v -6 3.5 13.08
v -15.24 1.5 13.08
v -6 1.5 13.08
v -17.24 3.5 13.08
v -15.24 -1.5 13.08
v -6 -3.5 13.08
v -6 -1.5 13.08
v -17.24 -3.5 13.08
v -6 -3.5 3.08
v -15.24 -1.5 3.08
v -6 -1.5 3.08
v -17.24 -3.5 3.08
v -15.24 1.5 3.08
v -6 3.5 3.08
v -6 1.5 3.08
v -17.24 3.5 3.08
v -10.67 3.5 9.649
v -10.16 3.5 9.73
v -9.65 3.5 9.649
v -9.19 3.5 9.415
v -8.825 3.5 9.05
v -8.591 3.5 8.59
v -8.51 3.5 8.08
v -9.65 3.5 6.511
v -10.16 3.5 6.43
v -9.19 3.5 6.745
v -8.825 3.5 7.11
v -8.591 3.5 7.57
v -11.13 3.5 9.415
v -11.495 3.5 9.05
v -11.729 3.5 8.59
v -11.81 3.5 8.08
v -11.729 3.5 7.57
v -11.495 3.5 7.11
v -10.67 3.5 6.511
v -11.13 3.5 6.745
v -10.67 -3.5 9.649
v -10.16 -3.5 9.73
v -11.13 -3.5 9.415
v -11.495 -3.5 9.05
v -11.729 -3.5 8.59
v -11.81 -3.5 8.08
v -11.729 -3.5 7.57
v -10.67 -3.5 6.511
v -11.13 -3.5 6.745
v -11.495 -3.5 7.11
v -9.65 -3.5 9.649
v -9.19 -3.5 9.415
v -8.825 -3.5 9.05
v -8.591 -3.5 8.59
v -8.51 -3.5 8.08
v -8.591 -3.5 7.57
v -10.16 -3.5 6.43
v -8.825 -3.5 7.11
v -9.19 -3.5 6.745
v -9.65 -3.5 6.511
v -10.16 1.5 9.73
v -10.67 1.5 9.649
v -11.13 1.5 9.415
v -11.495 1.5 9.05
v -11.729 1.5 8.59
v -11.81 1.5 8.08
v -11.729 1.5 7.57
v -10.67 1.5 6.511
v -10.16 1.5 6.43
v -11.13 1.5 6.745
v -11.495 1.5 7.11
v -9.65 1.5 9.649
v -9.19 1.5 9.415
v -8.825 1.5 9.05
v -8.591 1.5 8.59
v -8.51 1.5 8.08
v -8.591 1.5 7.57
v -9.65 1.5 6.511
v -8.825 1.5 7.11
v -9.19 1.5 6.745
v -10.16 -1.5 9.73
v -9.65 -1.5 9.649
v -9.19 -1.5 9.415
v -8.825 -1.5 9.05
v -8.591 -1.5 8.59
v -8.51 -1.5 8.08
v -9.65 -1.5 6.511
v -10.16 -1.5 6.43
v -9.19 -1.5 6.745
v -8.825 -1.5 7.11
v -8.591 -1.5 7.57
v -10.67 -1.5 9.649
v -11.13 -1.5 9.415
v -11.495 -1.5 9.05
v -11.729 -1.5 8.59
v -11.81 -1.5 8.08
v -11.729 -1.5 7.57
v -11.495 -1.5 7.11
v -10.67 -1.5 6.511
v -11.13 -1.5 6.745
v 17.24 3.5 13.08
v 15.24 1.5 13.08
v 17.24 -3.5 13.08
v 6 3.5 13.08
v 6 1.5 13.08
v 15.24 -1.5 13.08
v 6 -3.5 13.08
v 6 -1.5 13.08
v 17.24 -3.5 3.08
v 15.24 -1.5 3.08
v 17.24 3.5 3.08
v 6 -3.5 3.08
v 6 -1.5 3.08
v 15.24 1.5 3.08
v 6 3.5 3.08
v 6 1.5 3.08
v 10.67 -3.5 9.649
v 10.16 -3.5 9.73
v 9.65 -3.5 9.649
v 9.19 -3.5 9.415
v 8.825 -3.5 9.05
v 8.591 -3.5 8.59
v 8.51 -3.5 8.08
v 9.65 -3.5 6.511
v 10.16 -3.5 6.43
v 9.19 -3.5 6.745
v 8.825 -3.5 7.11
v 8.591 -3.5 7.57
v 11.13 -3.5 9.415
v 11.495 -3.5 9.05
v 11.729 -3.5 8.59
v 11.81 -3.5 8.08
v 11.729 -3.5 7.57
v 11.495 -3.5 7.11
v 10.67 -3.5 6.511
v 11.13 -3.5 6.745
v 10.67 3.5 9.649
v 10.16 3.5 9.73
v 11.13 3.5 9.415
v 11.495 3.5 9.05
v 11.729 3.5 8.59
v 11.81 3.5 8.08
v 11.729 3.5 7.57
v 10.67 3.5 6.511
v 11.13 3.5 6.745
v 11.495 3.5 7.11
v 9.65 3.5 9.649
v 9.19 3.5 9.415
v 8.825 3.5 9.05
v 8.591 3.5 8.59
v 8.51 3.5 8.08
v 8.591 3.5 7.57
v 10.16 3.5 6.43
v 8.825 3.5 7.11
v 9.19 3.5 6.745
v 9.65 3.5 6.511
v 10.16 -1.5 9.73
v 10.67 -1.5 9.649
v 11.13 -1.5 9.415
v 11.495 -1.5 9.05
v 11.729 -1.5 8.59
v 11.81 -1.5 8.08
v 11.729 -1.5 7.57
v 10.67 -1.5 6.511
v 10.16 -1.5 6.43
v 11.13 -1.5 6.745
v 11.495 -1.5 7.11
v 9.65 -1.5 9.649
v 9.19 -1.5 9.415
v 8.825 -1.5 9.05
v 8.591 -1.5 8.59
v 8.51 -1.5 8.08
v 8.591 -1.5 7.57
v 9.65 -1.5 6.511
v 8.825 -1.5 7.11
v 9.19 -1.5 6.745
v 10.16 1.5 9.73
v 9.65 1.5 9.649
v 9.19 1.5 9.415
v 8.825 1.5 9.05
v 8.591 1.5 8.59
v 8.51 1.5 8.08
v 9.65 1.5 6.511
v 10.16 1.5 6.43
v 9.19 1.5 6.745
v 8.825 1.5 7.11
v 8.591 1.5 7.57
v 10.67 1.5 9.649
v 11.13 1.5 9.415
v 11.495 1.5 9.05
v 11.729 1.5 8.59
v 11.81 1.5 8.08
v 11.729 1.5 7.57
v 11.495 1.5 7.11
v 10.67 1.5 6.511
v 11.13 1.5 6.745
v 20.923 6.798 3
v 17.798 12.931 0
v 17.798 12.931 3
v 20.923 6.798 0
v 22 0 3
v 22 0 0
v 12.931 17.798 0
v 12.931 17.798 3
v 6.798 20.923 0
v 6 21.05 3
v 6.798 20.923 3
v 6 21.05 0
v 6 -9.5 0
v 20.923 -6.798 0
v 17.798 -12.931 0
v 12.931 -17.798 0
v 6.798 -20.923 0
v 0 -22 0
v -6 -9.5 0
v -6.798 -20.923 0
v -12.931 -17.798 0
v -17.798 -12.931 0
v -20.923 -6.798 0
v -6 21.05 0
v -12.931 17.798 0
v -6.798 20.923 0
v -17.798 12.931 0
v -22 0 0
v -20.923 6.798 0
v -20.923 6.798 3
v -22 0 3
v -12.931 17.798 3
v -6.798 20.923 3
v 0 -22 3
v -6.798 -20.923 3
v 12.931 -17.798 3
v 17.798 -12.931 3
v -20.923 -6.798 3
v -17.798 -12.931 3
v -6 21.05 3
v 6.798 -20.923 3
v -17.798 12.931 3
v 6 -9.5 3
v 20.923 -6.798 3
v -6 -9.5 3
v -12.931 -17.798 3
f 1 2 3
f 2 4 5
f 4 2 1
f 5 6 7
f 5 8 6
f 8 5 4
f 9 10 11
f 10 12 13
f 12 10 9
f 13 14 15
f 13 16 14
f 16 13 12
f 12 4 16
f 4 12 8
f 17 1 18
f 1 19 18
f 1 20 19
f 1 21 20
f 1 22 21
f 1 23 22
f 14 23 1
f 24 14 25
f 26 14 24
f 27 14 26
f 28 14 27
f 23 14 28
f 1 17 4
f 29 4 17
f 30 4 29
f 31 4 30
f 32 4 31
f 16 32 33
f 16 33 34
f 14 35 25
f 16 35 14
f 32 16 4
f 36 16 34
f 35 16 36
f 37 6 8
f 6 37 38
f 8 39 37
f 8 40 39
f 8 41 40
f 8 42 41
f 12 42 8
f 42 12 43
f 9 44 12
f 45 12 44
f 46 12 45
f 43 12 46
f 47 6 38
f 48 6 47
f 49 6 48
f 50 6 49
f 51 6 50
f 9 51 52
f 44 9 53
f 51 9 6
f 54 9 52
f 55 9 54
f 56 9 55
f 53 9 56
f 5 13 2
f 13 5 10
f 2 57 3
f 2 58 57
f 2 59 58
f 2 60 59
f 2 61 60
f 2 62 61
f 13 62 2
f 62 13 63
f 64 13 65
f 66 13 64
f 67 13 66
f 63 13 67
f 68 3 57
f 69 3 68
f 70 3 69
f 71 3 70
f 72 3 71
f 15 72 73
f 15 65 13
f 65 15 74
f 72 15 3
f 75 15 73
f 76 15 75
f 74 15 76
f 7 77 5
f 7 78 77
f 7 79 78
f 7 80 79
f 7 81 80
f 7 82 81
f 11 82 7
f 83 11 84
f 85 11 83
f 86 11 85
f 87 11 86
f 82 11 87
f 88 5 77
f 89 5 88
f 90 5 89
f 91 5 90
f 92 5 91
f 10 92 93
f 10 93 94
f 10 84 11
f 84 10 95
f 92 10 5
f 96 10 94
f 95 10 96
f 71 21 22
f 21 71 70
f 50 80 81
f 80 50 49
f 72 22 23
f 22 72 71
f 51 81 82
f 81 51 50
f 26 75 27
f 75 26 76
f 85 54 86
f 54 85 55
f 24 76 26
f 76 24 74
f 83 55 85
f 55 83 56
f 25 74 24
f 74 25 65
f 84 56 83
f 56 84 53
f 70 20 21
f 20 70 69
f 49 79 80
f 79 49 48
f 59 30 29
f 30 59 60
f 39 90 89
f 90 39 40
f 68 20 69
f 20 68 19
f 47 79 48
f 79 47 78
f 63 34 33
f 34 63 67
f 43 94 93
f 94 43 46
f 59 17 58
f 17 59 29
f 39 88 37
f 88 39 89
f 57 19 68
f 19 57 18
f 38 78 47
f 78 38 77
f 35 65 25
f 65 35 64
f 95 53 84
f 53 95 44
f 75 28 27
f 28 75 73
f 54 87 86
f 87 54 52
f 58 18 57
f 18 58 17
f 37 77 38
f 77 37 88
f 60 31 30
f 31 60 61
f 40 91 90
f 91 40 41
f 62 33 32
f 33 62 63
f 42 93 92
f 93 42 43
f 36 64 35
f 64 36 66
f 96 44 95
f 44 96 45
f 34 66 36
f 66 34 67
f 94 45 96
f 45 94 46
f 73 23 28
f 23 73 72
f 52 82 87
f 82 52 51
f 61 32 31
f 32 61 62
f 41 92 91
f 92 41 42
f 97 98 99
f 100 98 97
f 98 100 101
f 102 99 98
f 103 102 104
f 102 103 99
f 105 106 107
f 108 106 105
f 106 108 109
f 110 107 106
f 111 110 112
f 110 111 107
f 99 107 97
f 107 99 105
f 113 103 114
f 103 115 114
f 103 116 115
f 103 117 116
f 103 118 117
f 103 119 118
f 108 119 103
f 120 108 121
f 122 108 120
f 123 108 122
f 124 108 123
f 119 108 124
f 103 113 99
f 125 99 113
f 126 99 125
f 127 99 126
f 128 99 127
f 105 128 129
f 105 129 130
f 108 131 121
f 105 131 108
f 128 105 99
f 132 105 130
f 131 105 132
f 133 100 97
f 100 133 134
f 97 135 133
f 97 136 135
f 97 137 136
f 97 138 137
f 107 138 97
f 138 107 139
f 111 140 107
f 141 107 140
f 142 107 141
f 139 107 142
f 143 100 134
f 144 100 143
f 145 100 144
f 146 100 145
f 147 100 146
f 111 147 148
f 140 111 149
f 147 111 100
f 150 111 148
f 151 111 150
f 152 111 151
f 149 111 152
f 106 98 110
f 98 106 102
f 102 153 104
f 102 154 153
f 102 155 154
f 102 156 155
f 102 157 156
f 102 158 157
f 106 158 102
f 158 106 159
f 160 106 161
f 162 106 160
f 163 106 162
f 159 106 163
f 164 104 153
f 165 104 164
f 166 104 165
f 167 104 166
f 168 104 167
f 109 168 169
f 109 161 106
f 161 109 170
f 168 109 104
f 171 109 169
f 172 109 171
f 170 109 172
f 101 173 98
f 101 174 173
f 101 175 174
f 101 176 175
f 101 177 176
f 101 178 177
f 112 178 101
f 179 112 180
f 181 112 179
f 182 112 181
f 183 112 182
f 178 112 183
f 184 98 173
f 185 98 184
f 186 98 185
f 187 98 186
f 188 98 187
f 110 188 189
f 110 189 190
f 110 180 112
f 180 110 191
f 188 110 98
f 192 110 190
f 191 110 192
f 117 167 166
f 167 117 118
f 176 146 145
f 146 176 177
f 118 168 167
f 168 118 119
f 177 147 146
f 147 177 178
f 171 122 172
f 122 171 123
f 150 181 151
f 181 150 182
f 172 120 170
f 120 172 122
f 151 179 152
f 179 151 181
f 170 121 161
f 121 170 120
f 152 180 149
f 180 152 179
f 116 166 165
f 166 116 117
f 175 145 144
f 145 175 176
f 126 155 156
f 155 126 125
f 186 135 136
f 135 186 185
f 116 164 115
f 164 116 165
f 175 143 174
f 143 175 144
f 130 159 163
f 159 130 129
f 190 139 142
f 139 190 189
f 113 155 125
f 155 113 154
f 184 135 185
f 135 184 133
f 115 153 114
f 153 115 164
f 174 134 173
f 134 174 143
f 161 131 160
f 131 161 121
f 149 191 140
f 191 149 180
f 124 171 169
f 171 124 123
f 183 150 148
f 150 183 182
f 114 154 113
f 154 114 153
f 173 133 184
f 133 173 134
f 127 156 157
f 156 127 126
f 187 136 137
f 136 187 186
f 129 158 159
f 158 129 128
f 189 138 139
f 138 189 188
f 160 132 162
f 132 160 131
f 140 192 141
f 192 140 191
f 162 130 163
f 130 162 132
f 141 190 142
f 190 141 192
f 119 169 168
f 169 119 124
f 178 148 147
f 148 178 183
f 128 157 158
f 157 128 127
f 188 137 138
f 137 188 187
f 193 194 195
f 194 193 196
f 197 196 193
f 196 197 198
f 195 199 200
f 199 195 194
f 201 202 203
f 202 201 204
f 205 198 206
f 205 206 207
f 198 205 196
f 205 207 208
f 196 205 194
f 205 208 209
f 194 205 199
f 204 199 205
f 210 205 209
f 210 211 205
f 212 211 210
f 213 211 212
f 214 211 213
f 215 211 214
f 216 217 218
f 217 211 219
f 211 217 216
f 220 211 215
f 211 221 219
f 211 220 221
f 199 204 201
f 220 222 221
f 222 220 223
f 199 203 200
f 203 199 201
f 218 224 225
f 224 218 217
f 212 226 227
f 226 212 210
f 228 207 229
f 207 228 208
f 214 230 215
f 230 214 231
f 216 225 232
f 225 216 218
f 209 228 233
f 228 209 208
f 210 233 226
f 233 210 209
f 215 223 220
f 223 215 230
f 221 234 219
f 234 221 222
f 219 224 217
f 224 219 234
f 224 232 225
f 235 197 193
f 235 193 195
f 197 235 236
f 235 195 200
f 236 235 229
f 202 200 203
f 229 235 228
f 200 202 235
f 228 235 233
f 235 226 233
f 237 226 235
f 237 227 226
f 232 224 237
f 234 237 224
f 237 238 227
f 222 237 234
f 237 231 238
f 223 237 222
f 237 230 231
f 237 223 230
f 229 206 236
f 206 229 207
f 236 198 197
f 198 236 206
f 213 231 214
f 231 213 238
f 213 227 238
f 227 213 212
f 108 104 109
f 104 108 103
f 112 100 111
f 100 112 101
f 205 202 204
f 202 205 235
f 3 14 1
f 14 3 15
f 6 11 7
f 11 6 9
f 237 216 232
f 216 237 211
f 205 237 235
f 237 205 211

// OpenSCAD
// file: lib/polyScrewThread_r1.scad
/*
 *    polyScrewThread_r1.scad    by aubenc @ Thingiverse
 *
 * This script contains the library modules that can be used to generate
 * threaded rods, screws and nuts.
 *
 * http://www.thingiverse.com/thing:8796
 *
 * CC Public Domain
 */

module screw_thread(od,st,lf0,lt,rs,cs)
{
    or=od/2;
    ir=or-st/2*cos(lf0)/sin(lf0);
    pf=2*PI*or;
    sn=floor(pf/rs);
    lfxy=360/sn;
    ttn=round(lt/st+1);
    zt=st/sn;

    intersection()
    {
        if (cs >= -1)
        {
           thread_shape(cs,lt,or,ir,sn,st);
        }

        full_thread(ttn,st,sn,zt,lfxy,or,ir);
    }
}

module hex_nut(df,hg,sth,clf,cod,crs)
{

    difference()
    {
        hex_head(hg,df);

        hex_countersink_ends(sth/2,cod,clf,crs,hg);

        screw_thread(cod,sth,clf,hg,crs,-2);
    }
}


module hex_screw(od,st,lf0,lt,rs,cs,df,hg,ntl,ntd)
{
    ntr=od/2-(st/2)*cos(lf0)/sin(lf0);

    union()
    {
        hex_head(hg,df);

        translate([0,0,hg])
        if ( ntl == 0 )
        {
            cylinder(h=0.01, r=ntr, center=true);
        }
        else
        {
            if ( ntd == -1 )
            {
                cylinder(h=ntl+0.01, r=ntr, $fn=floor(od*PI/rs), center=false);
            }
            else if ( ntd == 0 )
            {
                union()
                {
                    cylinder(h=ntl-st/2,
                             r=od/2, $fn=floor(od*PI/rs), center=false);

                    translate([0,0,ntl-st/2])
                    cylinder(h=st/2,
                             r1=od/2, r2=ntr, 
                             $fn=floor(od*PI/rs), center=false);
                }
            }
            else
            {
                cylinder(h=ntl, r=ntd/2, $fn=ntd*PI/rs, center=false);
            }
        }

        translate([0,0,ntl+hg]) screw_thread(od,st,lf0,lt,rs,cs);
    }
}

module hex_screw_0(od,st,lf0,lt,rs,cs,df,hg,ntl,ntd)
{
    ntr=od/2-(st/2)*cos(lf0)/sin(lf0);

    union()
    {
        hex_head_0(hg,df);

        translate([0,0,hg])
        if ( ntl == 0 )
        {
            cylinder(h=0.01, r=ntr, center=true);
        }
        else
        {
            if ( ntd == -1 )
            {
                cylinder(h=ntl+0.01, r=ntr, $fn=floor(od*PI/rs), center=false);
            }
            else if ( ntd == 0 )
            {
                union()
                {
                    cylinder(h=ntl-st/2,
                             r=od/2, $fn=floor(od*PI/rs), center=false);

                    translate([0,0,ntl-st/2])
                    cylinder(h=st/2,
                             r1=od/2, r2=ntr, 
                             $fn=floor(od*PI/rs), center=false);
                }
            }
            else
            {
                cylinder(h=ntl, r=ntd/2, $fn=ntd*PI/rs, center=false);
            }
        }

        translate([0,0,ntl+hg]) screw_thread(od,st,lf0,lt,rs,cs);
    }
}

module thread_shape(cs,lt,or,ir,sn,st)
{
    if ( cs == 0 )
    {
        cylinder(h=lt, r=or, $fn=sn, center=false);
    }
    else
    {
        union()
        {
            translate([0,0,st/2])
              cylinder(h=lt-st+0.005, r=or, $fn=sn, center=false);

            if ( cs == -1 || cs == 2 )
            {
                cylinder(h=st/2, r1=ir, r2=or, $fn=sn, center=false);
            }
            else
            {
                cylinder(h=st/2, r=or, $fn=sn, center=false);
            }

            translate([0,0,lt-st/2])
            if ( cs == 1 || cs == 2 )
            {
                  cylinder(h=st/2, r1=or, r2=ir, $fn=sn, center=false);
            }
            else
            {
                cylinder(h=st/2, r=or, $fn=sn, center=false);
            }
        }
    }
}

module full_thread(ttn,st,sn,zt,lfxy,or,ir)
{
  if(ir >= 0.2)
  {
    for(i=[0:ttn-1])
    {
        for(j=[0:sn-1])
			assign( pt = [	[0,                  0,                  i*st-st            ],
                        [ir*cos(j*lfxy),     ir*sin(j*lfxy),     i*st+j*zt-st       ],
                        [ir*cos((j+1)*lfxy), ir*sin((j+1)*lfxy), i*st+(j+1)*zt-st   ],
								[0,0,i*st],
                        [or*cos(j*lfxy),     or*sin(j*lfxy),     i*st+j*zt-st/2     ],
                        [or*cos((j+1)*lfxy), or*sin((j+1)*lfxy), i*st+(j+1)*zt-st/2 ],
                        [ir*cos(j*lfxy),     ir*sin(j*lfxy),     i*st+j*zt          ],
                        [ir*cos((j+1)*lfxy), ir*sin((j+1)*lfxy), i*st+(j+1)*zt      ],
                        [0,                  0,                  i*st+st            ]	])
        {
            polyhedron(points=pt,
              		  triangles=[	[1,0,3],[1,3,6],[6,3,8],[1,6,4],
											[0,1,2],[1,4,2],[2,4,5],[5,4,6],[5,6,7],[7,6,8],
											[7,8,3],[0,2,3],[3,2,7],[7,2,5]	]);
        }
    }
  }
  else
  {
    echo("Step Degrees too agresive, the thread will not be made!!");
    echo("Try to increase de value for the degrees and/or...");
    echo(" decrease the pitch value and/or...");
    echo(" increase the outer diameter value.");
  }
}

module hex_head(hg,df)
{
	rd0=df/2/sin(60);
	x0=0;	x1=df/2;	x2=x1+hg/2;
	y0=0;	y1=hg/2;	y2=hg;

	intersection()
	{
	   cylinder(h=hg, r=rd0, $fn=6, center=false);

		rotate_extrude(convexity=10, $fn=6*round(df*PI/6/0.5))
		polygon([ [x0,y0],[x1,y0],[x2,y1],[x1,y2],[x0,y2] ]);
	}
}

module hex_head_0(hg,df)
{
    cylinder(h=hg, r=df/2/sin(60), $fn=6, center=false);
}

module hex_countersink_ends(chg,cod,clf,crs,hg)
{
    translate([0,0,-0.1])
    cylinder(h=chg+0.01, 
             r1=cod/2, 
             r2=cod/2-(chg+0.1)*cos(clf)/sin(clf),
             $fn=floor(cod*PI/crs), center=false);

    translate([0,0,hg-chg+0.1])
    cylinder(h=chg+0.01, 
             r1=cod/2-(chg+0.1)*cos(clf)/sin(clf),
             r2=cod/2, 
             $fn=floor(cod*PI/crs), center=false);
}
// file: ../configuration.scad
//$fn=40; // model faces resolution.

//COMMON PARAMETERS
global_clearance = 0.5; // additional space where needed due to printer precision
layer_thickness = 0.3; // layer which is going to be removed after printing
//M3 x 12 Bolt
M3_nut_diameter = 6.6;
M3_nut_height = 2.7;
M3_bolt_diameter = 3.2;
M3_bolt_head_height = 3;
M3_bolt_length = 12;
//M5 Bolt
M5_bolt_diameter = 5.5;
M5_nut_height = 4.5;
M5_nut_diameter = 9.4;
//M6 Bolt
M6_bolt_diameter = 6.5;
M6_nut_height = 4.9;
M6_nut_diameter = 11.8;


//----------------------------------------------------------------
//----------------------------------------------------------------
//WINDGAUGE02A_S02 - Parametry pro hlavni valec anemometru
S01_hloubka_zavitu=4;
S01_vyska=110; //80
S01_prumer_vnitrni=50;
S01_sila_materialu=1.2;
S01_vyska_horni_zavit=10;
S01_vyska_spodniho_zavitu=10;
S01_sila_drzaku_RJ11=3; //vyška drážky
S01_hrana_A_RJ11=12.3;
S01_hrana_B_RJ11=19;
S01_tolerance_zavit=1.5;

//Rozměry ložiska se závity
//LO_spodni_prumer=22;
LO_spodni_prumer=17.2; //bez krytu
LO_vyska_bez_krytu=15;
LO_doraz_prumer=44.3;
LO_horni_prumer=7.7;
LO_vyska_spodni_doraz=5;
LO_vyska_horni_doraz=9;
LO_vyska_dorazu=0;





//Obecné parametry
prumer_osicky=5.1;



//Parametry loziska
lozisko_prumer_vnitrni=4.9;
lozisko_prumer_vnejsi=16.1;
lozisko_vyska=5;
lozisko_prekryv=1.5;

//Parametry magnetu
magnet_prumer=6.3;
magnet_vyska=5;
magnet_zapusteni=2;
magnet_tolerance_prumeru=0.2;

//Parametry sroubu
prumer_sroubu=3.4;
prumer_hlavy_sroubu=8.2;
vyska_hlavy_sroubu=4.3;
vyska_matky=3;
sirka_matky=6.7;

sirka_matky_tol=0.175;
prumer_orechu=10;

//WINDGAUGE02A_R01 //pro lopatku
L01_hrana_drzaku_a=10;
L01_hrana_drzaku_b=3;
L01_delka_uchytu=19;
L01_prumer_lopatky=40;
L01_sila_materialu_lopatky=0.9;

//WINDGAUGE02A_D02 Anemometer holder
//   | |   Top ring with Screw-thread
//  /   \  Body
// |_____| Base
D02_magnet_base_height = 4.5 + 1.5*global_clearance; // HS-13 M5 magnet height without bolt
D02_magnet_diameter = 13 + global_clearance; // HS-13 M5 magnet diameter
D02_wall_thickness = 5; // body wall thickness
D02_connector_spacing = 40; // main body cut-through for connectors
D02_base_diameter = 80; // diameter of holder base
D02_base_height = max(M6_nut_height + 1.5,
                      D02_magnet_base_height + M5_nut_height/2 + 1.5); // height of holder base
D02_body_height = 60 - D02_base_height; // height of body between base and top ring
D02_screw_diameter = S01_prumer_vnitrni - S01_tolerance_zavit; // scew-thread diameter based on stand S01
D02_thread_height = S01_vyska_spodniho_zavitu; // screw-thread height based on stand S01
D02_top_ring_inner_diameter = D02_screw_diameter - 6; // inner diameter of top ring
D02_top_ring_outer_diameter = D02_screw_diameter + 4; // outer diameter of top ring
D02_top_ring_height = D02_thread_height + 5; // height of top ring
D02_total_height = D02_base_height + D02_body_height + D02_top_ring_height; // total height of anemometer holder
// Following parameters are obsolete, maintained only for compatibility.
D01_material_pod_zavitem = D02_top_ring_height - D02_thread_height;
D01_material_za_zavitem = D02_screw_diameter - D02_top_ring_inner_diameter;
D01_material_pred_zavitem = D02_top_ring_outer_diameter - D02_screw_diameter;
D01_polomer_zakladny = D02_base_diameter/2;
D01_sila_setny_spodniho_drzaku=D02_wall_thickness;
D01_vyska_spodni_casti_drzaku = D02_body_height + D02_base_height;
D01_sirka_otvoru_pro_konektor = D02_connector_spacing;
D01_ucyhtna_matice_material_nad = D02_base_height - M6_nut_height;
D01_uchytna_matice_vyska = M6_nut_height;
D01_uchytna_matice_sirka = M6_nut_diameter;
D01_uchytny_sroub_prumer = M6_bolt_diameter;

// Following parameters are actually used in D01 model.
//WINDGAUGE02A_D02 //uchyt na sloup
D02_sila_materialu=6;
D02_vyska_uchytky=40;
D02_prumer_obruby=27; // 3/4 trubka
D02_delka_celeho_uchytu=60;
D02_dotahova_vzdalenost=1.5;
D02_prumer_uchytneho_sroubu=4.2;
D02_sirka_matky=9.1; //pro M4
D02_vyska_matky=3;


//WINDGAUGE02A_R01 //rotor s prekritim statoru
R01_vyska_prekryti_statoru=10;
R01_sila_materialu_pro_prekriti=1.3;
R01_mezera_mezi_statorem_rotorem=3;

//WINDGAUGE02A_R03 //drzak magnetu
R05_sirka_matky=10;



R03_prumer_zavitu=40;
R04_zavit_vyska=5;
R02_zavit_vyska=10;
R01_zavit_vyska=5;
R03_mezera_mezi_statorem_rotorem=3;

R02_delka_kridla=45;
R02_vzdalenost_der=25;

R02_delka_vyrovnnavaci_tyce=35;
R02_hrana_drzaku=14;
R02_sila_materialu_pod_tyci=5;
R02_sila_materialu_kridla=1.2;
R02_sila_materialu_kridla_tolerance=0.3;

R05_vyska_kridla=100;
R05_delka_kridla=100;


//S04
 I2CDIFF01A_sirka_kon=16.5; //sirka konektoru
 I2CDIFF01A_vyska_kon=13.5; //vyska konektoru
 I2CDIFF01A_sirka_mod_otvory=4; //kolik modul zabira der
 I2CDIFF01A_vyska_PCB=2; //vyska mezi albase a konektorem
S04_sila_materialu=2;

//S04_USBI2C01A
 USBI2C01A_sirka_kon=12; //sirka konektoru
 USBI2C01A_vyska_kon=11; //vyska konektoru
 USBI2C01A_sirka_mod_otvory=3; //kolik modul zabira der
 USBI2C01A_vyska_PCB=2; //vyska mezi albase a konektorem


//WINDGAUGE03A_R03 // Venturi tube
R03_wide_D = 36; // Venturi wide tube inner diameter
R03_narrow_D = R03_wide_D/2; // Venturi narrow tube inner diameter
R03_global_clearance = global_clearance; // additional space where needed due to printer precision
R03_PCB_top_rim = 5; // vertical distance from top of tube to top of PCB
R03_PCB_height = 41; // height of PCB casing - if changed check casing
R03_PCB_width = 14; // width of PCB casing - if changed check casing
R03_PCB_depth = 3.7; // depth of PCB casing - if changed check casing
R03_PCB_connector_overlay = 2.5; // additional depth of PCB casing on connectors side - if changed check casing
R03_PCB_elevation = 2; // additional elevation of PCB for waterproofing
R03_air_tube_diameter = 2; // air tubes diameter
R03_sensor_offset = 2.2;  // SDP33 distance from PCB border to sensor
R03_sensor_pitch = 4.3;  // SDP33 distance between sensors
R03_sensor_diameter = 3.5;  // SDP33 sensor diameter
R03_sensor_depth = 2.5;  // SDP33 sensor depth
R03_slip_ring_offset = 0; // slip-ring offset from tube center
R03_venturi_tube_height = 150;  // Venturi tube height (limited by max print size)
R03_wall_thickness = 3; // Venturi tube wall thickness
R03_sealing_ring_thickness = 1.5; // sealing ring size
R03_fin_width = 0.8; // width of vertical stabilizator
R03_fin_length = 150; // length of vertical stabilizator
R03_fin_height = 150; // height of vertical stabilizator
R03_fin_holder_width = M3_bolt_length + M3_nut_height;
R03_fin_holder_height = M3_nut_diameter + 2*R03_wall_thickness;
R03_fin_holder_depth = R03_wide_D/2 + R03_fin_holder_height;
R03_balance_shelf_width = 20; // width of shelf for balance weights
R03_balance_shelf_height = 10; // height of shelf for balance weights
// main file
include <../configuration.scad>
include <./lib/polyScrewThread_r1.scad>

draft = true;
$fn = draft ? 20 : 100; // model faces resolution
PI=3.141592;

module DRZAK()
{
    difference()
    {
        translate([-S04_sila_materialu/2, 0, 5.08])
            cube([10.16 + 1*S04_sila_materialu, 3 + 2*S04_sila_materialu, 10], true);

        translate([0, 0, 5.08])
            cube([10.16, 3, 10 + 0.01], true);

        translate([0, 5, 5.08])
            rotate ([90, 0, 0])
                cylinder(h = 30, r=(3.3 / 2));
    }
}

//Držák pro modul USBI2C01A
module WINDGAUGE01A_S04_USBI2C01A(draft = true)
{
    difference()
    {
        union(){
            translate([0, 0, 0])
                cylinder(h = S01_sila_drzaku_RJ11,
                     r = S01_prumer_vnitrni/2 - S01_hloubka_zavitu/2 - 1.0);

                     
            //drzaky PCB 
            translate([-USBI2C01A_sirka_mod_otvory*10.16/2 + 5.08, 0, S01_sila_drzaku_RJ11])
                DRZAK();

            translate([USBI2C01A_sirka_mod_otvory*10.16/2-5.08, 0, S01_sila_drzaku_RJ11])
                rotate ([0, 0, 180])
                    DRZAK();
             
                }   
        //otvor pro konektor
        translate([0, 0, S01_sila_drzaku_RJ11/2])
            cube([USBI2C01A_sirka_kon, S01_hrana_B_RJ11, S01_sila_drzaku_RJ11+30+0.01],
                 center=true);

        //otvor až ke kraji
        translate([0, (S01_prumer_vnitrni/2 - S01_hloubka_zavitu/2 + 0.5)/2,
                   S01_sila_drzaku_RJ11/2])
            cube([USBI2C01A_sirka_kon,
                  S01_prumer_vnitrni/2 - S01_hloubka_zavitu/2 + 0.5,
                  S01_sila_drzaku_RJ11+0.01],
                 center=true);
    }

    
    }

difference()
{
    // If not draft -> move to print position.
    if (!draft)
        translate([0, 0, 0])
            rotate([0, 0, 0])
                WINDGAUGE01A_S04_USBI2C01A(false);
    else
        WINDGAUGE01A_S04_USBI2C01A();
    // Cut-out cube not needed in this model
    //if (draft)
    //    translate([0, 0, 0])
    //        cube(10);
}
